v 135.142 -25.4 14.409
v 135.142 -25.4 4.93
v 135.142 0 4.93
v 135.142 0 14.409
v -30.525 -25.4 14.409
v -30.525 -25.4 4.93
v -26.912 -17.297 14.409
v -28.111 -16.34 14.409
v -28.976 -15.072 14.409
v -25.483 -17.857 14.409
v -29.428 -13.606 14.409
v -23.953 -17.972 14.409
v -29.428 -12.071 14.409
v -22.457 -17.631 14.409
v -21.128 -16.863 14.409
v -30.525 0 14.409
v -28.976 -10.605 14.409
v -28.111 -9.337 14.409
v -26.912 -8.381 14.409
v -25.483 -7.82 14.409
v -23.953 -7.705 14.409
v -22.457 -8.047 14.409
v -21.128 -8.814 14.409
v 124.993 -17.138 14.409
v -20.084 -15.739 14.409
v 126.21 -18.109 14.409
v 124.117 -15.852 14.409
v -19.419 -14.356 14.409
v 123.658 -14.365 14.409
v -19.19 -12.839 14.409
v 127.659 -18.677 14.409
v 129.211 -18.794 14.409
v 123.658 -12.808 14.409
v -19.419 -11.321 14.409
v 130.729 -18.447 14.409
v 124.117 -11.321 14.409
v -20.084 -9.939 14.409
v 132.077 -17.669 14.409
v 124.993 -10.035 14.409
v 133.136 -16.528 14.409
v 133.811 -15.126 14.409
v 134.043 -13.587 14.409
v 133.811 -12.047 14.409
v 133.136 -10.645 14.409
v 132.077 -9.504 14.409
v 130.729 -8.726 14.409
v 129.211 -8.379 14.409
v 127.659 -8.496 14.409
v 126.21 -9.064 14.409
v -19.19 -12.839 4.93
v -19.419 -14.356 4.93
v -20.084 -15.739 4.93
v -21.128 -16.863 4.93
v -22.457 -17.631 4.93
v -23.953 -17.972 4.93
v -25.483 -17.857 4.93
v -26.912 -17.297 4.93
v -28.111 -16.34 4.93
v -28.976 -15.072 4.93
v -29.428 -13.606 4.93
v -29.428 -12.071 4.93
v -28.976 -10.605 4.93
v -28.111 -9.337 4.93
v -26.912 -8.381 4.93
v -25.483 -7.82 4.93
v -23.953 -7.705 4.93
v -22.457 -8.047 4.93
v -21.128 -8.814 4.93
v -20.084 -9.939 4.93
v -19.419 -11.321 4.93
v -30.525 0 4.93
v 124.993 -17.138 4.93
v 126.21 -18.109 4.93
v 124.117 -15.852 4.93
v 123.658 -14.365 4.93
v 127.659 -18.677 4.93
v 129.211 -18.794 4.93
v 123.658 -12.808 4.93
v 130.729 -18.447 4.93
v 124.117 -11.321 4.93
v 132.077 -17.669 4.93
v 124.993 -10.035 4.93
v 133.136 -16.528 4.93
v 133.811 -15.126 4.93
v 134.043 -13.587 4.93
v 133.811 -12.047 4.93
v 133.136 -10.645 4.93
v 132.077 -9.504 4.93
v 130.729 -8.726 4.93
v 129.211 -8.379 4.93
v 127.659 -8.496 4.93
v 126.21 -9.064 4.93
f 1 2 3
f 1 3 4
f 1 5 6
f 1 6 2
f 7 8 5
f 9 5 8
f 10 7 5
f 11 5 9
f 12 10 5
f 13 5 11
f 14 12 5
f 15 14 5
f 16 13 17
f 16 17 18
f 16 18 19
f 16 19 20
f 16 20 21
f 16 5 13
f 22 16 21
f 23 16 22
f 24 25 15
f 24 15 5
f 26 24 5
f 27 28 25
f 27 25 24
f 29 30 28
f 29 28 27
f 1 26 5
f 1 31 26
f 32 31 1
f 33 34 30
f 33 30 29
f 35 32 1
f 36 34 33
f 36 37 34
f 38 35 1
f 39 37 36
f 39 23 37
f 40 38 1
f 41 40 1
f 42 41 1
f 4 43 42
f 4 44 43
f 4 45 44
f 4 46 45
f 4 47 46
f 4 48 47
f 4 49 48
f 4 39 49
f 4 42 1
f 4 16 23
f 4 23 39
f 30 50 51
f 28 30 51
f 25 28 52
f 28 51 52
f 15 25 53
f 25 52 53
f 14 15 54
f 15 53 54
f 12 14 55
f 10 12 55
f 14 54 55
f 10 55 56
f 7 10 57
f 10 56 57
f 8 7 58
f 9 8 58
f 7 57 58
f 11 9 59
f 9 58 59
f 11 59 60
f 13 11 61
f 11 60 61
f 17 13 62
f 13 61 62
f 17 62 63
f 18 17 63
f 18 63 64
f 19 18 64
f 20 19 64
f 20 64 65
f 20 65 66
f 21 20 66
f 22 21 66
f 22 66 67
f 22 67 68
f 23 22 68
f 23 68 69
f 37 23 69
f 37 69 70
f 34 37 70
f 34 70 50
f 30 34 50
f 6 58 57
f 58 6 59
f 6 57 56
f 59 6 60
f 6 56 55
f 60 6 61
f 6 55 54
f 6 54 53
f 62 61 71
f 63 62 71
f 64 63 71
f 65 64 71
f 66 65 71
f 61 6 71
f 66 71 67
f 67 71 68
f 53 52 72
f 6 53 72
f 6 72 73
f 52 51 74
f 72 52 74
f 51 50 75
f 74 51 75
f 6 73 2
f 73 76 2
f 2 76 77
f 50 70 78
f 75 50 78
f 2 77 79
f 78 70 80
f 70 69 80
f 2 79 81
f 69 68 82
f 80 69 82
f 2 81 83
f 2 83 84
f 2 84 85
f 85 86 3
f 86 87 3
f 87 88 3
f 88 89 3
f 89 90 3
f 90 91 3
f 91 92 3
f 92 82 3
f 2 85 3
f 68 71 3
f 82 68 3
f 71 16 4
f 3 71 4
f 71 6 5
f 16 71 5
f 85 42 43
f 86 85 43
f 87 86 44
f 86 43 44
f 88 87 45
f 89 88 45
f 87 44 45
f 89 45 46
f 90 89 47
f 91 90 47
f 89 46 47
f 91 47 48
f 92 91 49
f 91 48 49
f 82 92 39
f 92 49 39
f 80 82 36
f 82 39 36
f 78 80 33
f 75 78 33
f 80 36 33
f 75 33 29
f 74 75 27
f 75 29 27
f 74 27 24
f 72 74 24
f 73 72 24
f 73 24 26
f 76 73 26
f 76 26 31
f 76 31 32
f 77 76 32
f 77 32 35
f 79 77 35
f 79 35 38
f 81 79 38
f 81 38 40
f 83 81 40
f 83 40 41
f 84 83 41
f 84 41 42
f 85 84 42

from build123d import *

# Parameters (mm, degrees)
F0_W     = 165.6668949872
F0_H     = 9.4798584469
F1_DEPTH = 25.4
F2_R     = 5.1477874533
F3_DEPTH = 25.4
F4_R     = 5.221731546
F5_DEPTH = 25.4


with BuildPart() as f1:
    # F0 (on Front) → F1 (new body)
    with BuildSketch(Plane.XZ):
        with Locations((52.3083051667, 9.6694554668)):
            Rectangle(F0_W, F0_H)
    extrude(amount=F1_DEPTH)

    # F2 (on face) → F3 (cut)
    with BuildSketch(Plane(origin=(0, 0, 4.9295262434), x_dir=(1, 0, 0), z_dir=(0, 0, -1))):
        with Locations((-24.3377815932, 12.8386663273)):
            Circle(F2_R)
    extrude(amount=-F3_DEPTH, mode=Mode.SUBTRACT)

    # F4 (on face) → F5 (cut)
    with BuildSketch(Plane.XY.offset(14.4093846902)):
        with Locations((128.8211345673, -13.5866040364)):
            Circle(F4_R)
    extrude(amount=-F5_DEPTH, mode=Mode.SUBTRACT)


solid = f1.part
